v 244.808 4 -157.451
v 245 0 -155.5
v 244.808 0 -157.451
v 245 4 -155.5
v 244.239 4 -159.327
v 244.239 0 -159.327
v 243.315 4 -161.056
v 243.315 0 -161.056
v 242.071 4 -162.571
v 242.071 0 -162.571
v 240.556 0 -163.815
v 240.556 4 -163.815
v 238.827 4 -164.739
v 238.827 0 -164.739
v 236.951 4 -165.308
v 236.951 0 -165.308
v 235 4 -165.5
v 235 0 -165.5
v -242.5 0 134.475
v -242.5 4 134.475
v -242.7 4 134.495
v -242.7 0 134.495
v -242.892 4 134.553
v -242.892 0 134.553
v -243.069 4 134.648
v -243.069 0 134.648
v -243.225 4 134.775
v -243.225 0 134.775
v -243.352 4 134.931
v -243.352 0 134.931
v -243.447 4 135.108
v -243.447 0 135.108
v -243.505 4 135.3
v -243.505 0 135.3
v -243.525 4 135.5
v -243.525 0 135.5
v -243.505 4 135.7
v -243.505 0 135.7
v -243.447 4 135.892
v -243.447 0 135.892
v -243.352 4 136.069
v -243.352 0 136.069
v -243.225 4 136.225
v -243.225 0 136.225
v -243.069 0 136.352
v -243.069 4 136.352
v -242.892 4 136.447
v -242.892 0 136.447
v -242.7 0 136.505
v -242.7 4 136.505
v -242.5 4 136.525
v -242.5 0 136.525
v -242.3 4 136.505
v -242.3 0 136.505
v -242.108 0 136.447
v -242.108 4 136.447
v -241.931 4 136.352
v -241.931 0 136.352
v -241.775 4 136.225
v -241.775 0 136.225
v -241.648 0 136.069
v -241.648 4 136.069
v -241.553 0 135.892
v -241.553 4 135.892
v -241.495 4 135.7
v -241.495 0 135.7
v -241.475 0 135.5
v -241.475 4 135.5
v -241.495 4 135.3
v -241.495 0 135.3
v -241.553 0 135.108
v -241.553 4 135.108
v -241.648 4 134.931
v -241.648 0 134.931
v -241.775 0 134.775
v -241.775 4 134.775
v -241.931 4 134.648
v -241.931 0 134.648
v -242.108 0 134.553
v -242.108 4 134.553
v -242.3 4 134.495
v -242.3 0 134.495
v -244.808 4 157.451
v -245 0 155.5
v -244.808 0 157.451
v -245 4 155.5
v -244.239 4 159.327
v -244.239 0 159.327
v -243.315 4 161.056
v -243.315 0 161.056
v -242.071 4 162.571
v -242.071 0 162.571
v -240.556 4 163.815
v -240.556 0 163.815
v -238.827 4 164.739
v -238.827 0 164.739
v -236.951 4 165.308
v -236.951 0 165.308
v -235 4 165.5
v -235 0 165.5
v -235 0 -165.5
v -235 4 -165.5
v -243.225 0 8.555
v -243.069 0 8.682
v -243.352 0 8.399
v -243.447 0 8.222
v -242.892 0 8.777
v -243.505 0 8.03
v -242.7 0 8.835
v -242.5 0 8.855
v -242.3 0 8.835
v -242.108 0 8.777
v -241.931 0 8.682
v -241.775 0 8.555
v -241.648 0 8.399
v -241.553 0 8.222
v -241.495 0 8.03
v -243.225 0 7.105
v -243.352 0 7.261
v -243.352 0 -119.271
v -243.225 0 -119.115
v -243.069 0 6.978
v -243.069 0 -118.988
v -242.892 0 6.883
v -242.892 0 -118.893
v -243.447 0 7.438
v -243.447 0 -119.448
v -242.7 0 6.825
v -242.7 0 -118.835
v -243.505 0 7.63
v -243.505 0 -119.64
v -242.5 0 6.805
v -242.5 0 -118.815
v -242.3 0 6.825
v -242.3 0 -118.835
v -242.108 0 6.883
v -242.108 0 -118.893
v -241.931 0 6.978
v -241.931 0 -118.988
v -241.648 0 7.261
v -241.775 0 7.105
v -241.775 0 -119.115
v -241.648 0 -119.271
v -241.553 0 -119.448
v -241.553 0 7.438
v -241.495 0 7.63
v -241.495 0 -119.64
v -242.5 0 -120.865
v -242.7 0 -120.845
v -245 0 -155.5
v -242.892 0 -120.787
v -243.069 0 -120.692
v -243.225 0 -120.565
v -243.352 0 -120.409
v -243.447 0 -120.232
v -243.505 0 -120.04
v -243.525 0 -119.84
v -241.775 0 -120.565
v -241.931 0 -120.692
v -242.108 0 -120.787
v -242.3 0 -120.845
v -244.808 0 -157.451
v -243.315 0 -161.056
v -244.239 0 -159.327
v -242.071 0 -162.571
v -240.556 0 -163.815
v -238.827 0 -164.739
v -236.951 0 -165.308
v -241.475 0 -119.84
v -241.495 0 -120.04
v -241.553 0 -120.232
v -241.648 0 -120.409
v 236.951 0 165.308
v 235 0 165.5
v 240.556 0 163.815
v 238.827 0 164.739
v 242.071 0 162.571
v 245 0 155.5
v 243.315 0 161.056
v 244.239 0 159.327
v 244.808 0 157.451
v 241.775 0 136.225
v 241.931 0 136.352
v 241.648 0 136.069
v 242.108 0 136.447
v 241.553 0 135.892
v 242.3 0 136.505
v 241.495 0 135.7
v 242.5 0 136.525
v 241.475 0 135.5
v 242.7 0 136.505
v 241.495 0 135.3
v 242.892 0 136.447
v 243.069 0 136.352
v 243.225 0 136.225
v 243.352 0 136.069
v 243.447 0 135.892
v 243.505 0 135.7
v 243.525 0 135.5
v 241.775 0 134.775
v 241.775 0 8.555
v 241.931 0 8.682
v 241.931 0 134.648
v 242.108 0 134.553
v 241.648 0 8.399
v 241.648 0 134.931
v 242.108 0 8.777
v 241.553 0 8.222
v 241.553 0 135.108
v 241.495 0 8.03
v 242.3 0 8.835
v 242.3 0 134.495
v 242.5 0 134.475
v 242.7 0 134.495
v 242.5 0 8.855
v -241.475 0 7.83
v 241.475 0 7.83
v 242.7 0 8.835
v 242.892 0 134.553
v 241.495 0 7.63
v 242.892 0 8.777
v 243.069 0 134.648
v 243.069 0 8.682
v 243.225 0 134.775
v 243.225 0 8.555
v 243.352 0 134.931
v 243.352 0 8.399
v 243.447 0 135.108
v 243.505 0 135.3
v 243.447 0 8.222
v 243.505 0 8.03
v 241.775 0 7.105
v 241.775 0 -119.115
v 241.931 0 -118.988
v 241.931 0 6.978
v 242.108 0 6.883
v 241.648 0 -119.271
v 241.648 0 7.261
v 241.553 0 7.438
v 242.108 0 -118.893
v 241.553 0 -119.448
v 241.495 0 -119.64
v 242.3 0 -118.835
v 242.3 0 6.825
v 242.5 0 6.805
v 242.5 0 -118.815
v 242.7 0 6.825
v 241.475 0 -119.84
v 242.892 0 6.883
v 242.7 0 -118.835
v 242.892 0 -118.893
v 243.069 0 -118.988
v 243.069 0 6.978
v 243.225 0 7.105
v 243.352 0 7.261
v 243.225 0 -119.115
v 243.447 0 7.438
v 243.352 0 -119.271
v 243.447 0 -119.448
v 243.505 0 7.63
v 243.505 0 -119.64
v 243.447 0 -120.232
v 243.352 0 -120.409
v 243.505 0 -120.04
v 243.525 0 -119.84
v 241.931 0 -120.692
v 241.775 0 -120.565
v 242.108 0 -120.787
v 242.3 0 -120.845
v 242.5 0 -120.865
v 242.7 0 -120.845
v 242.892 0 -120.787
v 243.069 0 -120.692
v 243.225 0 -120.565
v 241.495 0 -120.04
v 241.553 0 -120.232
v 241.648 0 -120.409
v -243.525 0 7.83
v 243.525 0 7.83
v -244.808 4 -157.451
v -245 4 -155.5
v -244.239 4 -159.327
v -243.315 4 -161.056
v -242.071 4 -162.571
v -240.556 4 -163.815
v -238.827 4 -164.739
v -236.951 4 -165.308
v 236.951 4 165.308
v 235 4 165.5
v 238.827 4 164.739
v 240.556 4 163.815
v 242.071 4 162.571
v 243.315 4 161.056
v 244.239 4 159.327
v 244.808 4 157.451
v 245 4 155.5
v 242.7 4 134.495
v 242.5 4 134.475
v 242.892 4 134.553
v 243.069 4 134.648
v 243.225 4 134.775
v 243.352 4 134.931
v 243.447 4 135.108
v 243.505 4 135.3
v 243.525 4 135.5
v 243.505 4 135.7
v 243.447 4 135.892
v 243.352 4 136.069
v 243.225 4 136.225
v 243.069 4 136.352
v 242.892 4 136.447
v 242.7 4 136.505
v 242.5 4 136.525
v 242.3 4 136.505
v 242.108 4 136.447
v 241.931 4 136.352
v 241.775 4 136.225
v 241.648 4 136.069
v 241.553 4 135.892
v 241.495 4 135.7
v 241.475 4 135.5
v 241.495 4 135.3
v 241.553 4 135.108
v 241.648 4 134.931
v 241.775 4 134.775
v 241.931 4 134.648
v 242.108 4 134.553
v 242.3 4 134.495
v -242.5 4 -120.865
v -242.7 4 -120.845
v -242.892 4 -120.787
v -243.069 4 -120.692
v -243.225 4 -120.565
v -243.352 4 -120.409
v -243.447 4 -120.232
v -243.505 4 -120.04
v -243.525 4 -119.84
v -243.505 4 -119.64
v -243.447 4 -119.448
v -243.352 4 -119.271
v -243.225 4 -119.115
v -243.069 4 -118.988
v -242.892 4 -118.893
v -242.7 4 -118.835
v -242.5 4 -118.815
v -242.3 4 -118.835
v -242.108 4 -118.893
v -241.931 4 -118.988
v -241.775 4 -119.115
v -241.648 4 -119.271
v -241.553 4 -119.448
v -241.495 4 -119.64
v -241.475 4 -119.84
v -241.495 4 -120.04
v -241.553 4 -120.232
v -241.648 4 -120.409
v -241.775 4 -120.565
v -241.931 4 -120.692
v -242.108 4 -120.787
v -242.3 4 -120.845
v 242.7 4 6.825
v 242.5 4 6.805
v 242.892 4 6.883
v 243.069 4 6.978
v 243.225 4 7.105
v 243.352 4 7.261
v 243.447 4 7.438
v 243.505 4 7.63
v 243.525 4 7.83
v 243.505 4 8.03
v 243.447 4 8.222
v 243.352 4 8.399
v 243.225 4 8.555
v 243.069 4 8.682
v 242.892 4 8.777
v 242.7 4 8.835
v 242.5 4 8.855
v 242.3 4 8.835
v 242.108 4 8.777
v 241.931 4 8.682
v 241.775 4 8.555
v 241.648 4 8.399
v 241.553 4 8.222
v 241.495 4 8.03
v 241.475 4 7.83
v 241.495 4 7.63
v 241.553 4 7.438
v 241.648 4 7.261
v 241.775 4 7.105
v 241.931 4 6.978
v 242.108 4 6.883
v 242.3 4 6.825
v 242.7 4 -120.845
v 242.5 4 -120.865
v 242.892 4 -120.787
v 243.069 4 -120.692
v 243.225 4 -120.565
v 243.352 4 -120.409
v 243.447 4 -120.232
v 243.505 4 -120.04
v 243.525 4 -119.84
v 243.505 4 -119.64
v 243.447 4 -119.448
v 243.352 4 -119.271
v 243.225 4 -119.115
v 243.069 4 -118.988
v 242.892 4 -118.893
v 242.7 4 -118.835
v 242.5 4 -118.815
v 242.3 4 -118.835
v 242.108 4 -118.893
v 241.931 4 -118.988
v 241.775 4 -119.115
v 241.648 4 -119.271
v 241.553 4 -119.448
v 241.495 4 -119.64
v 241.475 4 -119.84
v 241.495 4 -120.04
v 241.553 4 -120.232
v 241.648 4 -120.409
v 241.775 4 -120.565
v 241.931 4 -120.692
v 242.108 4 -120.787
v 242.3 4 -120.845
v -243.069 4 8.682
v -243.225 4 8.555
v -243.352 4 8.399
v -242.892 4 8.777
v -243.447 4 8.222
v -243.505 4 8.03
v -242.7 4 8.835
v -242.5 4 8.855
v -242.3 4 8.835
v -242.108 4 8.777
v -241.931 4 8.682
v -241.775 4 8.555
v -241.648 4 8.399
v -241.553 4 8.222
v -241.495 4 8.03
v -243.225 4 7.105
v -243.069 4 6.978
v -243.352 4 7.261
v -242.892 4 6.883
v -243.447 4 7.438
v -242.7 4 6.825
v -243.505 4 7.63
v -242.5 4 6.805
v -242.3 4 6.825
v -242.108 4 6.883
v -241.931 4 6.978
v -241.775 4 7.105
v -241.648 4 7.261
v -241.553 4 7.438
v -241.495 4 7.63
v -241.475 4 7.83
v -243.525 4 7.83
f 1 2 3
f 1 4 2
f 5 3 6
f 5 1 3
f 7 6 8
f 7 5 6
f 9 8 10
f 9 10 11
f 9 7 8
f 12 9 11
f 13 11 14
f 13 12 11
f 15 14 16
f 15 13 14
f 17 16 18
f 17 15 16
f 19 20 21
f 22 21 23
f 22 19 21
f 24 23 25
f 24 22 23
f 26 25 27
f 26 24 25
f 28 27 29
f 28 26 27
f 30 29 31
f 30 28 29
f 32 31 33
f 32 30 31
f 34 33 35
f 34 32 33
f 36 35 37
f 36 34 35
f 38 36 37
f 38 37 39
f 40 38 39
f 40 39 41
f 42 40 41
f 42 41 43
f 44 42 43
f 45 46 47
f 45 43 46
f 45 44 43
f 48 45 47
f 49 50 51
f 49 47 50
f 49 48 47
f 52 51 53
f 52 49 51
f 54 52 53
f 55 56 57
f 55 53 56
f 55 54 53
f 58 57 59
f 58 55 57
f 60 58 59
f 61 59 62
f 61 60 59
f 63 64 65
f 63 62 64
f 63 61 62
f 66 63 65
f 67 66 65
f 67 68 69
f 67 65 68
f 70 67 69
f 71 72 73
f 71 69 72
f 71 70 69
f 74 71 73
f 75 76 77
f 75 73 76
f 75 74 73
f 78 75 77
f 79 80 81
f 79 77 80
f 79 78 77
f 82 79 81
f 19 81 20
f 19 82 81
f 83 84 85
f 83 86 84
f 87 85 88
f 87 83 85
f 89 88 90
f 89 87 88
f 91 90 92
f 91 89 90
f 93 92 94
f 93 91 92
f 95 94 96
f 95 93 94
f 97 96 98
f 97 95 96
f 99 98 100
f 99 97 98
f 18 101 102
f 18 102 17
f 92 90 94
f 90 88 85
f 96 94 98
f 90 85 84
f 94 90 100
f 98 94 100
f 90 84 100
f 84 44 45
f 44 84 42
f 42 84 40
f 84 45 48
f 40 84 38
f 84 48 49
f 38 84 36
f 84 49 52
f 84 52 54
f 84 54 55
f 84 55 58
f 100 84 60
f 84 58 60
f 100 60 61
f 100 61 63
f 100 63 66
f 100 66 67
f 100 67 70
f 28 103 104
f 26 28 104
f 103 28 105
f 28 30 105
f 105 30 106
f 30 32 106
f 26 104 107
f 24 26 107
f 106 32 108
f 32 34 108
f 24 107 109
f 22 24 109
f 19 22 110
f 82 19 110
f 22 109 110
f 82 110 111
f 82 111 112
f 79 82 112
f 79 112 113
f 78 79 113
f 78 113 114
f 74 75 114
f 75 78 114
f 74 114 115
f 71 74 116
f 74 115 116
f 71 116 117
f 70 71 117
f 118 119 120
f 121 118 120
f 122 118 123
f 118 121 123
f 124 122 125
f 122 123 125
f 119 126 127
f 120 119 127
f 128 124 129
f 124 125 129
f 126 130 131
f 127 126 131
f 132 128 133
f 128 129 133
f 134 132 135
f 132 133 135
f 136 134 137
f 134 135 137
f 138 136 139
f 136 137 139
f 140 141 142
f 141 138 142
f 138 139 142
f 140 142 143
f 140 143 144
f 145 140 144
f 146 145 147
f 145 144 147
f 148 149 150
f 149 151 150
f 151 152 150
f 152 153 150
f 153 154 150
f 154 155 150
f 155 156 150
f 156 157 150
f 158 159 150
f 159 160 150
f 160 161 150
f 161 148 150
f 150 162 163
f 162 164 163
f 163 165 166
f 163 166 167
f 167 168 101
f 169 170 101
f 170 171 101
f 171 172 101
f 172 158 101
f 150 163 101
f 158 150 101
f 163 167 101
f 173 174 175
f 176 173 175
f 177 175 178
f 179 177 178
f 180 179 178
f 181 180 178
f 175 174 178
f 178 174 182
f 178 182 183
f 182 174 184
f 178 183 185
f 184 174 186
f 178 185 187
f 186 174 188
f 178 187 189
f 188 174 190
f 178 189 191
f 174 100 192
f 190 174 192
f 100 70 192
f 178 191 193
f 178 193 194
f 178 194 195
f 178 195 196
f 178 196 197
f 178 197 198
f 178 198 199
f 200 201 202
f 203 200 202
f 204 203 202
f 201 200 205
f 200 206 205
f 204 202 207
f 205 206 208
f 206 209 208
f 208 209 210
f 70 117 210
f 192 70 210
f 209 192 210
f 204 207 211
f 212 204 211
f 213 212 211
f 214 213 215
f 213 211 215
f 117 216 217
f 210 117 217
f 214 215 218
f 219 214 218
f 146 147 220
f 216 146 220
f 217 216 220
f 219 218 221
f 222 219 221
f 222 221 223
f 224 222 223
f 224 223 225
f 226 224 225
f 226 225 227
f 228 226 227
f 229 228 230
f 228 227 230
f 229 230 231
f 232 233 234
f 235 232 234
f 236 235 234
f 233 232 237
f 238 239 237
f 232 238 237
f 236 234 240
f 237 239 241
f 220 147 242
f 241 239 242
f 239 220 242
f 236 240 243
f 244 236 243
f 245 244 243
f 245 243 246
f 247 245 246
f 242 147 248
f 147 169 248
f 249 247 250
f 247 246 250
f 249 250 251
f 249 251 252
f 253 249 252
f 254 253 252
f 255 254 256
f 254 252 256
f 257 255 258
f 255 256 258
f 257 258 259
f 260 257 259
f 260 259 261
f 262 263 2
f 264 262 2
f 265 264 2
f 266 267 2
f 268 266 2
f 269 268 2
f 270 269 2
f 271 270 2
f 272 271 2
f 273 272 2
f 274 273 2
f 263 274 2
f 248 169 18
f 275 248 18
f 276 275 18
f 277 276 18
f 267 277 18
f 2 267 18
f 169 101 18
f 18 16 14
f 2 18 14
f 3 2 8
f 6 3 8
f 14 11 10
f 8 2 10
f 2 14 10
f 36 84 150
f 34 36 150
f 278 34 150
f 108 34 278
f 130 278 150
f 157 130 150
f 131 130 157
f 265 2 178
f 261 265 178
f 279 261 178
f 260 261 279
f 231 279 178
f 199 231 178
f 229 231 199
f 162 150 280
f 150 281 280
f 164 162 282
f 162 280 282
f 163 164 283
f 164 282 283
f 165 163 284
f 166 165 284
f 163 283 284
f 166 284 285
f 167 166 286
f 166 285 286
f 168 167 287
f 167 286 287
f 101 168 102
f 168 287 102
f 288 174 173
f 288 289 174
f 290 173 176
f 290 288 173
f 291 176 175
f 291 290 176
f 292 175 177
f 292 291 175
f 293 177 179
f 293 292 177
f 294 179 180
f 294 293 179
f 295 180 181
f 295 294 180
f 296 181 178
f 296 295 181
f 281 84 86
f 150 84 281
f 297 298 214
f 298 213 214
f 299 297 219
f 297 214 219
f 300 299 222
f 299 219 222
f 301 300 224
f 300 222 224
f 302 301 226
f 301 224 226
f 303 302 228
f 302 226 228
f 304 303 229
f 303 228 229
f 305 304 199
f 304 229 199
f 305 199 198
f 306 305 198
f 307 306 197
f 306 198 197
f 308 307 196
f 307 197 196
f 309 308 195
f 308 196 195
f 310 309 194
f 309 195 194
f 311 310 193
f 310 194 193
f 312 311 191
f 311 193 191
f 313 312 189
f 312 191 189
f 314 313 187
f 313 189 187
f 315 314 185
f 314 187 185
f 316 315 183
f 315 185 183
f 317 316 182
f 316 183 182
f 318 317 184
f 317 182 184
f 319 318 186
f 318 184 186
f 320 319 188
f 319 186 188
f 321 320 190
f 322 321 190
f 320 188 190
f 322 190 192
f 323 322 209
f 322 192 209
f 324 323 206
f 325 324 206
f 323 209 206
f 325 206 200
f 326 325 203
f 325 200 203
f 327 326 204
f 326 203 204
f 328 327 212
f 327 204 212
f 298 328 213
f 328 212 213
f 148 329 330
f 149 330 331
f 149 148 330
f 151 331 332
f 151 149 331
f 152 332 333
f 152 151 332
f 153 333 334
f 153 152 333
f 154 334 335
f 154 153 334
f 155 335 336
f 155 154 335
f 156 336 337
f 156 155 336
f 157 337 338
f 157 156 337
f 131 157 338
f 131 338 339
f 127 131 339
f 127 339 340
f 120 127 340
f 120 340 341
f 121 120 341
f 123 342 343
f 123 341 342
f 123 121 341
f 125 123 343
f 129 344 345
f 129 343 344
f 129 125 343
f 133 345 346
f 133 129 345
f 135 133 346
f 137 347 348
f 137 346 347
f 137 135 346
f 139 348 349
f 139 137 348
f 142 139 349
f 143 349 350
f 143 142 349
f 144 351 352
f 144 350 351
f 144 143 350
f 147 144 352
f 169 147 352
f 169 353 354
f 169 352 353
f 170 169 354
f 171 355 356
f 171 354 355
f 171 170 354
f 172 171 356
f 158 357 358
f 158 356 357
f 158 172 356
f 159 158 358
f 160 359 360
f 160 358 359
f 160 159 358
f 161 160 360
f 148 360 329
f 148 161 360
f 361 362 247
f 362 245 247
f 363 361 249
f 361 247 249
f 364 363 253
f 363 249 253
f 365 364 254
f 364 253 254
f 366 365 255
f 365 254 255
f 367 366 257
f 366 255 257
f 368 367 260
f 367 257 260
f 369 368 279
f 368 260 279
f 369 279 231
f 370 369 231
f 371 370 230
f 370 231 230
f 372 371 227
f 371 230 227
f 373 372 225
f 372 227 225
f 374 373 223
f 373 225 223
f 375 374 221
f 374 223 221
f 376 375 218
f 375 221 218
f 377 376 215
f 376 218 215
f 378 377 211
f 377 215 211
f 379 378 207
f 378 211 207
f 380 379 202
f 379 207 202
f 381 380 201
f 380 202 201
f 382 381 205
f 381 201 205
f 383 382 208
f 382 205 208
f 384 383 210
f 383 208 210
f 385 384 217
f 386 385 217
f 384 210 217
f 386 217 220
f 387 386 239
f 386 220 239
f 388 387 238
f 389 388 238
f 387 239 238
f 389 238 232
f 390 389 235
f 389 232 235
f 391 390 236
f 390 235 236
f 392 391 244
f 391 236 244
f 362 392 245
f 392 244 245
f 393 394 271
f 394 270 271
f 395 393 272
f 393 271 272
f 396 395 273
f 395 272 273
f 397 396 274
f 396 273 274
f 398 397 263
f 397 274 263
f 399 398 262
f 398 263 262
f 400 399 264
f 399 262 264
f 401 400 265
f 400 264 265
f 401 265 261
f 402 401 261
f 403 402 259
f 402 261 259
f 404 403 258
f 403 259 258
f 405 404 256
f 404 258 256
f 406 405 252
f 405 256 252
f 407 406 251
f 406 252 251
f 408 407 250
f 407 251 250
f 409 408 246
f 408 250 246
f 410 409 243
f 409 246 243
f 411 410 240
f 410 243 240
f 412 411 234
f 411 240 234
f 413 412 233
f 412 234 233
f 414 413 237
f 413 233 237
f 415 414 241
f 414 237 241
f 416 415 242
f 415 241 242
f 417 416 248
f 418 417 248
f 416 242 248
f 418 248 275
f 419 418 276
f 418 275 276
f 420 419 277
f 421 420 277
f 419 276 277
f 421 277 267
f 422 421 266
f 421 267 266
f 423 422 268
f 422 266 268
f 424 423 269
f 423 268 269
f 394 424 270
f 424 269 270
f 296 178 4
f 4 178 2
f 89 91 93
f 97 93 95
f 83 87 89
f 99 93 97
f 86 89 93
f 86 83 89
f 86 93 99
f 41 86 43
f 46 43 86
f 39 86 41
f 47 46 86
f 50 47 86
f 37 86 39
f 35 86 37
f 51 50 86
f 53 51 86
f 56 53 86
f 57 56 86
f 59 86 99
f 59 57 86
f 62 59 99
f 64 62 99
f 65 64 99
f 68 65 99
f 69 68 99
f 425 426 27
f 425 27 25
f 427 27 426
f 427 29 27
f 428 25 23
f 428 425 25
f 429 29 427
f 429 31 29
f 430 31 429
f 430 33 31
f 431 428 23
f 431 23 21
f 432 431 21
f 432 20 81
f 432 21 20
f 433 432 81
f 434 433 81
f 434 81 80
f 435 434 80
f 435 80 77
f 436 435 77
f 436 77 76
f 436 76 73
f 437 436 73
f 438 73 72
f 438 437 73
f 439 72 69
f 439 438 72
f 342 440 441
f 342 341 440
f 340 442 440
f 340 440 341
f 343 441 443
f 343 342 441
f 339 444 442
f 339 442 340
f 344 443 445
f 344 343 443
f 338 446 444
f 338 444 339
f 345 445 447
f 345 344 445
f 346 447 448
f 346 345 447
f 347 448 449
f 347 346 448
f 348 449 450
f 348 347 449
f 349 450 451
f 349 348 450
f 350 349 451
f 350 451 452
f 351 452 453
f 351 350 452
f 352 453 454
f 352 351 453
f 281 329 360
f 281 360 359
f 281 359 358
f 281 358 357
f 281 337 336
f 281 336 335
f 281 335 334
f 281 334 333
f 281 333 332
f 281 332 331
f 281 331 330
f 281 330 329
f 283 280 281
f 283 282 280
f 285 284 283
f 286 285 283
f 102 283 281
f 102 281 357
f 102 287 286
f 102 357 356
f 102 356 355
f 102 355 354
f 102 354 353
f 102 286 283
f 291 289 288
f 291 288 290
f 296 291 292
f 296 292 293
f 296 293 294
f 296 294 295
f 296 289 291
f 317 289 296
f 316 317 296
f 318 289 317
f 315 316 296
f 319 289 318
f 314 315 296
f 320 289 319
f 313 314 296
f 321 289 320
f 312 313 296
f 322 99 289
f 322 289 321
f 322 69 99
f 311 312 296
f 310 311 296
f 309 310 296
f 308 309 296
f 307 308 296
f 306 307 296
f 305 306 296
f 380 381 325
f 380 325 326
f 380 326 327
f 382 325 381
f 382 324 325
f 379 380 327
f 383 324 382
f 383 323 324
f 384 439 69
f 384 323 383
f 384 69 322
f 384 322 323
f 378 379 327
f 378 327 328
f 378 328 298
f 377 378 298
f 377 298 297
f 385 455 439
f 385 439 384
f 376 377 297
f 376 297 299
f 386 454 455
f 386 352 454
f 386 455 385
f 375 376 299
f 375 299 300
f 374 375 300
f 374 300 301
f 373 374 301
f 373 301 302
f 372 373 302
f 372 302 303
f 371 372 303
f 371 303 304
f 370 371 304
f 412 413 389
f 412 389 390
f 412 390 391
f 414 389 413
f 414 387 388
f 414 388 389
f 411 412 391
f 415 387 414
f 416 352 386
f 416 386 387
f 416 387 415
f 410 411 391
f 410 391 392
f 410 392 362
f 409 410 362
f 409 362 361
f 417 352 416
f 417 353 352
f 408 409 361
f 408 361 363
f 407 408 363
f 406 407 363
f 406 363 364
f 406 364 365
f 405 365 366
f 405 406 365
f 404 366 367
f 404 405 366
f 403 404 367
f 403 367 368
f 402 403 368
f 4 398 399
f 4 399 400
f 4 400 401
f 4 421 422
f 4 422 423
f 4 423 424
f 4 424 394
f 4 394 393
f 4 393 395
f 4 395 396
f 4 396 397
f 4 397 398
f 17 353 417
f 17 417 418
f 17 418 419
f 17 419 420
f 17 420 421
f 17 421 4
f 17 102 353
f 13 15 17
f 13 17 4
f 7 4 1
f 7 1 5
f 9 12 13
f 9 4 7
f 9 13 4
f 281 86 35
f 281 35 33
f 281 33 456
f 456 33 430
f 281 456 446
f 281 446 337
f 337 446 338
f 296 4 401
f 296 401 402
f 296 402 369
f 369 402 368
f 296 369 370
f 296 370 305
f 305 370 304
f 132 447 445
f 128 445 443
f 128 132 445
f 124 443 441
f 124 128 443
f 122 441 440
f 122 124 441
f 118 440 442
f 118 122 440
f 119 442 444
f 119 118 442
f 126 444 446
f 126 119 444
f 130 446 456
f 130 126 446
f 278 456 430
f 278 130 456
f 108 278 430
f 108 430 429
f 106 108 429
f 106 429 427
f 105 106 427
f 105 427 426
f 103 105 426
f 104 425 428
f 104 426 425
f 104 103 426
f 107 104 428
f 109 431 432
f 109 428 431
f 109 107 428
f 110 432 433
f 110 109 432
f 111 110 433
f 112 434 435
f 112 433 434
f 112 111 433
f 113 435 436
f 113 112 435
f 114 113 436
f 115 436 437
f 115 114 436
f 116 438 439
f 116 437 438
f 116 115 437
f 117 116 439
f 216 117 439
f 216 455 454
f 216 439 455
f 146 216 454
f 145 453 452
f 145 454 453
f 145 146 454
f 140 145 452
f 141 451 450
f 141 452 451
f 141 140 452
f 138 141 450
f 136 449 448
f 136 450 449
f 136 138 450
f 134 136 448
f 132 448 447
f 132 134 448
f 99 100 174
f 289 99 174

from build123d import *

# Parameters (mm, degrees)
SKETCH1_W           = 490
SKETCH1_H           = 331
BOSS_EXTRUDE1_DEPTH = 4
FILLET1_R           = 10
LPATTERN2_COUNT     = 3
LPATTERN2_PITCH     = 127.67


with BuildPart() as part:
    # Sketch1 → Boss-Extrude1 (new body)
    with BuildSketch(Plane(origin=(0, 0, 0), x_dir=(1, 0, 0), z_dir=(0, 1, 0))):
        Rectangle(SKETCH1_W, SKETCH1_H)
    extrude(amount=BOSS_EXTRUDE1_DEPTH)

    # Fillet1
    fillet1_edges = [part.edges().sort_by_distance(p)[0] for p in [
        (-245, 2, -165.5),
        (245, 2, -165.5),
        (245, 2, 165.5),
        (-245, 2, 165.5),
    ]]
    fillet(fillet1_edges, radius=FILLET1_R)

    # Sketch4 → Tap Drill for M2.5x0.45 Tap1 (revolve, cut)
    with BuildSketch(Plane(origin=(-242.5, 0, 135.5), x_dir=(0, 0, -1), z_dir=(1, 0, 0))):
        Polygon((0, 0), (0, 5.615882135), (1.025, 5), (1.025, 0), align=None)
    tap_drill_for_m2_5x0_45_tap1 = revolve(axis=Axis((-242.5, -6.35, 135.5), (0, 1, 0)), mode=Mode.SUBTRACT)

    # LPattern2: Tap Drill for M2.5x0.45 Tap1 ×3
    with Locations(*[(0, 0, -i * LPATTERN2_PITCH) for i in range(1, LPATTERN2_COUNT)]):
        add(tap_drill_for_m2_5x0_45_tap1, mode=Mode.SUBTRACT)

    # Mirror2: Tap Drill for M2.5x0.45 Tap1 across plane
    add(tap_drill_for_m2_5x0_45_tap1.mirror(Plane(origin=(0, 0, 0), x_dir=(0, 0, 1), z_dir=(1, 0, 0))), mode=Mode.SUBTRACT)

    # Mirror2 copy 1 sketch → Mirror2 copy 1 (revolve, cut)
    with BuildSketch(Plane(origin=(242.5, 0, 7.83), x_dir=(0, 0, -1), z_dir=(-1, 0, 0))):
        Polygon((0, 0), (0, -5.615882135), (1.025, -5), (1.025, 0), align=None)
    revolve(axis=Axis((242.5, -6.35, 7.83), (0, -1, 0)), mode=Mode.SUBTRACT)

    # Mirror2 copy 2 sketch → Mirror2 copy 2 (revolve, cut)
    with BuildSketch(Plane(origin=(242.5, 0, -119.84), x_dir=(0, 0, -1), z_dir=(-1, 0, 0))):
        Polygon((0, 0), (0, -5.615882135), (1.025, -5), (1.025, 0), align=None)
    revolve(axis=Axis((242.5, -6.35, -119.84), (0, -1, 0)), mode=Mode.SUBTRACT)


solid = part.part
